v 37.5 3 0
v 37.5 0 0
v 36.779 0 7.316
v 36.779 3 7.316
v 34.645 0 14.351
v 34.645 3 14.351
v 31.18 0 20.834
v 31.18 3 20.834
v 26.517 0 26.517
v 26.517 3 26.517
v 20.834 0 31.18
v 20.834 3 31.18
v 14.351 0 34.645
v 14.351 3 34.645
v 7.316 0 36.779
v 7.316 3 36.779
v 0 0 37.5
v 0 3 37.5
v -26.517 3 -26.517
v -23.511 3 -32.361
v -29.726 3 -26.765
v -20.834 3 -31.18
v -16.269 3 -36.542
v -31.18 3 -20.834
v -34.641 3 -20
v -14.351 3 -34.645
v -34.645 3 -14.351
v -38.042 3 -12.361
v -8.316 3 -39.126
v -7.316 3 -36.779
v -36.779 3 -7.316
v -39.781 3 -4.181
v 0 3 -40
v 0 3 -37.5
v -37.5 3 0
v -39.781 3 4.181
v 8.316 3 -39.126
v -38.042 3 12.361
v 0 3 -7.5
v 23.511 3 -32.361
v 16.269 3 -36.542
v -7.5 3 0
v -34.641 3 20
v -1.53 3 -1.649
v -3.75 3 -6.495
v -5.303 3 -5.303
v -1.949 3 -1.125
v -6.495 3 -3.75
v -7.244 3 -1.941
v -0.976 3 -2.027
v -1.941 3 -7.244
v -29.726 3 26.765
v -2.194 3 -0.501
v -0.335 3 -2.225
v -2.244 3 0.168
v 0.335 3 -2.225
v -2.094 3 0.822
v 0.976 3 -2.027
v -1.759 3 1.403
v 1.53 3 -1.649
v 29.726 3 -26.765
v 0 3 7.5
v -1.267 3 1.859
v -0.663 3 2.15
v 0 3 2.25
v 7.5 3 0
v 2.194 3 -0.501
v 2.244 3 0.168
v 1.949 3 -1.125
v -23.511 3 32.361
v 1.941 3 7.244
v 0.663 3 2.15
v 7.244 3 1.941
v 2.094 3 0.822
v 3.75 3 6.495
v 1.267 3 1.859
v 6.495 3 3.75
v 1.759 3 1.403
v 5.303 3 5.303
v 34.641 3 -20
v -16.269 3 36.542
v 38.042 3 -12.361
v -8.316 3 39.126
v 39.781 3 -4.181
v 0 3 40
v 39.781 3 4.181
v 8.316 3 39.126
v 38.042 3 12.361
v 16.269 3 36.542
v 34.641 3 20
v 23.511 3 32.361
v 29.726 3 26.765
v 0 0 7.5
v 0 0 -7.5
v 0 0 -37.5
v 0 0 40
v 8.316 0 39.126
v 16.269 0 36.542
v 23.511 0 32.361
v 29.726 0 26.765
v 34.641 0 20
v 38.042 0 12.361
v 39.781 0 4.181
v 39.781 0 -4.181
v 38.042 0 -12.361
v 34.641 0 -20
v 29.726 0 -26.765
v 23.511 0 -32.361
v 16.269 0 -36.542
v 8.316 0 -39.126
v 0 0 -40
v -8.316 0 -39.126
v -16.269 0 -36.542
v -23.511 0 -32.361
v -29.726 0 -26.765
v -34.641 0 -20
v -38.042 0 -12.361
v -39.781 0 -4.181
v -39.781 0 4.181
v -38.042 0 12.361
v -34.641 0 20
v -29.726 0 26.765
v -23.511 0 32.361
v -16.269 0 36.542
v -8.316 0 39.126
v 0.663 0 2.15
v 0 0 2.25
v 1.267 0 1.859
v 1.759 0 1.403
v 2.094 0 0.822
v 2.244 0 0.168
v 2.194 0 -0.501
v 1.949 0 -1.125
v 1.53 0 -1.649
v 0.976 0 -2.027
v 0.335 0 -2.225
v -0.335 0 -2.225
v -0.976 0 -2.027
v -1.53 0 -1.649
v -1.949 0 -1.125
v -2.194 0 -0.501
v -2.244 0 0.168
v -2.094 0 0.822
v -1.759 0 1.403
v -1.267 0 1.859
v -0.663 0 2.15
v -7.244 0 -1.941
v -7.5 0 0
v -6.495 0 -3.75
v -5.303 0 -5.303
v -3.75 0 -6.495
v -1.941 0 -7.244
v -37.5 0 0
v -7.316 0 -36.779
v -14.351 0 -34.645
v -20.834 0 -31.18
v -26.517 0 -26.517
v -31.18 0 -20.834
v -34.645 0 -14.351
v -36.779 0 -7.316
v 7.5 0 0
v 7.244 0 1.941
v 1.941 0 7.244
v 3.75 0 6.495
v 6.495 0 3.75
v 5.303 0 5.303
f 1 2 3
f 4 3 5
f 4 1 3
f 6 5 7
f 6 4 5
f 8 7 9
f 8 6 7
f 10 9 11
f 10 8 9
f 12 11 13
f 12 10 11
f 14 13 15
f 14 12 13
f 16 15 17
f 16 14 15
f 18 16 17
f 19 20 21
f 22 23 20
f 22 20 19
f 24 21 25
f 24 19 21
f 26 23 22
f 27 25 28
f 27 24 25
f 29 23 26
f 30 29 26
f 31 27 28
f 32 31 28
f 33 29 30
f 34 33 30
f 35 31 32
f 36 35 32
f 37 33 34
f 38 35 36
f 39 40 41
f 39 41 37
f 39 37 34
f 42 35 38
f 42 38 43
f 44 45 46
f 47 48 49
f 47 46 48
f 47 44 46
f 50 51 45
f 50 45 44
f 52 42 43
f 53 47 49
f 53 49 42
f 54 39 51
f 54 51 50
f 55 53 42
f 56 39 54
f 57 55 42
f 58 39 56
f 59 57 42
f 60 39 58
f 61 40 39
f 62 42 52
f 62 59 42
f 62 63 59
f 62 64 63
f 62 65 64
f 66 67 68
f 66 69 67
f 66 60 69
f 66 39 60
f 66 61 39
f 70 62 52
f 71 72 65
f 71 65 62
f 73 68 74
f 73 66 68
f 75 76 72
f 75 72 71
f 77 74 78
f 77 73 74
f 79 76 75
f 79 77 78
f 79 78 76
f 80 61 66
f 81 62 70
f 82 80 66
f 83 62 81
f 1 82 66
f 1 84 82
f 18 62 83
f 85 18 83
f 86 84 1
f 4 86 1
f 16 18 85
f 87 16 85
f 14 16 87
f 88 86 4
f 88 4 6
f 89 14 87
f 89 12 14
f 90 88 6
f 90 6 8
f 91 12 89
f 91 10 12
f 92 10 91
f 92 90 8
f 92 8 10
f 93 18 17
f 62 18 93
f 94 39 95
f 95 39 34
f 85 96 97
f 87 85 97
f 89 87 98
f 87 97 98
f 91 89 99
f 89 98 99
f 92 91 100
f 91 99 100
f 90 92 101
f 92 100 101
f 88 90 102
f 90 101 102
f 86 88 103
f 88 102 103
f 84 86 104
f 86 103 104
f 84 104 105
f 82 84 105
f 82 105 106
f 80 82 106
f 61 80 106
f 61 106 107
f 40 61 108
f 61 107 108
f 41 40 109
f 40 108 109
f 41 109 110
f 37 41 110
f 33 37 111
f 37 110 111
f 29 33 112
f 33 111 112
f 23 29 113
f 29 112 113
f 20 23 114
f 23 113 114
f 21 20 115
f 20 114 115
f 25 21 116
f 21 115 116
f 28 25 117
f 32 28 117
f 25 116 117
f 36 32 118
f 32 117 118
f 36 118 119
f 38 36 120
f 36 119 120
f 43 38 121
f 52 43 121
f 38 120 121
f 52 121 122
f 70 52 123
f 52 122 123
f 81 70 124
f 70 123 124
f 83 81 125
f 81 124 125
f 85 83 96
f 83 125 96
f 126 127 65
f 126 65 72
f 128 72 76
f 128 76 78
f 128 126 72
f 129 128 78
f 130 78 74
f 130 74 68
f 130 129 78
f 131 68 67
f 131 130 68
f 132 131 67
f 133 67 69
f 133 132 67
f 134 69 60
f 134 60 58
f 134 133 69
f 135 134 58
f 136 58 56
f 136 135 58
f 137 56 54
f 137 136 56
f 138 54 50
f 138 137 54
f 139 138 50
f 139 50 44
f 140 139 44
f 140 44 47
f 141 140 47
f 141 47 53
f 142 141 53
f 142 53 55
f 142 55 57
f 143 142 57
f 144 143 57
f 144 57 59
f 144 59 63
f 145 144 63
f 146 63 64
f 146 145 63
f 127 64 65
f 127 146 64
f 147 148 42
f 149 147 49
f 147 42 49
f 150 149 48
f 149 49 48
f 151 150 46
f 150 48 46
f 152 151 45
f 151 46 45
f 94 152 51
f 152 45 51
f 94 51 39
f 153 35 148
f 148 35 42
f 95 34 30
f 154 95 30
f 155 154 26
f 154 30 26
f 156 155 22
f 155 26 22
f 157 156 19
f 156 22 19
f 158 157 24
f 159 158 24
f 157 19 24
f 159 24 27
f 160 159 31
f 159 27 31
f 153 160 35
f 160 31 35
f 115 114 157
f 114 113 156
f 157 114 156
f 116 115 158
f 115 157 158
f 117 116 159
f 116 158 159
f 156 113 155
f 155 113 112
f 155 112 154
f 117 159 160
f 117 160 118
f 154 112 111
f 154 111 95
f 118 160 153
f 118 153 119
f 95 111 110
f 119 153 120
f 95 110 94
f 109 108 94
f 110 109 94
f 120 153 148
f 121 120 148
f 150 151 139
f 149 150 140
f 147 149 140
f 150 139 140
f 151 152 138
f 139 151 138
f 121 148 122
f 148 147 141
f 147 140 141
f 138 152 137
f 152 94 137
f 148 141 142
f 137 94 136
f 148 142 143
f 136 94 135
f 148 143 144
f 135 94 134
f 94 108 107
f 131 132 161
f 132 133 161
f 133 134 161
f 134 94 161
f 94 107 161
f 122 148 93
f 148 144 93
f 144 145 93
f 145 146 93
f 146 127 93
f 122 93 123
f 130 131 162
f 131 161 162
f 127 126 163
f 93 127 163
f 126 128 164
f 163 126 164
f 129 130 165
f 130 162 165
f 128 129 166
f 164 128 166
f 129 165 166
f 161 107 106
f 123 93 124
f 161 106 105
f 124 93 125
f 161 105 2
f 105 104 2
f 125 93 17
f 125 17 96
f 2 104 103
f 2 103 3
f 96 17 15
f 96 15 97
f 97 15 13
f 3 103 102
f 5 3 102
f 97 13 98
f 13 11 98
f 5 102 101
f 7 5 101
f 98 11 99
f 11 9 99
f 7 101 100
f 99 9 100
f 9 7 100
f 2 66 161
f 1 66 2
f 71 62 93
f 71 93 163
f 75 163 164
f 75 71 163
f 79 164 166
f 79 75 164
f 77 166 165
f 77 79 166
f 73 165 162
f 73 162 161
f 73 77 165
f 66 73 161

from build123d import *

# Parameters (mm, degrees)
SKETCH_1_R          = 40
SKETCH_1_R_2        = 2.25
EXTRUDE_1_DEPTH     = 3
CUT_EXTRUDE_1_REACH = 58.648


with BuildPart() as part:
    # 草图1 → 凸台-拉伸1 (new body)
    with BuildSketch(Plane(origin=(0, 0, 0), x_dir=(1, 0, 0), z_dir=(0, 1, 0))):
        with Locations(Location((0, 0, 0), (0, 0, 270))):
            Circle(SKETCH_1_R)
        with Locations(Location((0, 0, 0), (0, 0, 270))):
            Circle(SKETCH_1_R_2, mode=Mode.SUBTRACT)
    extrude(amount=EXTRUDE_1_DEPTH)

    # 草图2 → 切除-拉伸1 (cut, up to next)
    with BuildSketch(Plane(origin=(0, 3, 0), x_dir=(1, 0, 0), z_dir=(0, 1, 0)), mode=Mode.PRIVATE) as cut_extrude_1_sk1:
        with BuildLine():
            Line((-37.5, 0), (-7.5, 0))
            ThreePointArc((-7.5, 0), (-5.303300859, 5.303300859), (0, 7.5))
            Line((0, 7.5), (0, 37.5))
            ThreePointArc((0, 37.5), (-26.516504294, 26.516504294), (-37.5, 0))
        make_face()
    cut_extrude_1_tool1 = extrude(cut_extrude_1_sk1.sketch, amount=-CUT_EXTRUDE_1_REACH, mode=Mode.PRIVATE) & part.part
    # 草图2 → 切除-拉伸1 (cut, up to next)
    with BuildSketch(Plane(origin=(0, 3, 0), x_dir=(1, 0, 0), z_dir=(0, 1, 0)), mode=Mode.PRIVATE) as cut_extrude_1_sk2:
        with BuildLine():
            Line((7.5, 0), (37.5, 0))
            ThreePointArc((37.5, 0), (26.516504294, -26.516504294), (0, -37.5))
            Line((0, -37.5), (0, -7.5))
            ThreePointArc((0, -7.5), (5.303300859, -5.303300859), (7.5, 0))
        make_face()
    cut_extrude_1_tool2 = extrude(cut_extrude_1_sk2.sketch, amount=-CUT_EXTRUDE_1_REACH, mode=Mode.PRIVATE) & part.part
    add(cut_extrude_1_tool1.solids().sort_by_distance((-16.446011, 3, -16.446011))[0], mode=Mode.SUBTRACT)
    add(cut_extrude_1_tool2.solids().sort_by_distance((16.446011, 3, 16.446011))[0], mode=Mode.SUBTRACT)


solid = part.part
